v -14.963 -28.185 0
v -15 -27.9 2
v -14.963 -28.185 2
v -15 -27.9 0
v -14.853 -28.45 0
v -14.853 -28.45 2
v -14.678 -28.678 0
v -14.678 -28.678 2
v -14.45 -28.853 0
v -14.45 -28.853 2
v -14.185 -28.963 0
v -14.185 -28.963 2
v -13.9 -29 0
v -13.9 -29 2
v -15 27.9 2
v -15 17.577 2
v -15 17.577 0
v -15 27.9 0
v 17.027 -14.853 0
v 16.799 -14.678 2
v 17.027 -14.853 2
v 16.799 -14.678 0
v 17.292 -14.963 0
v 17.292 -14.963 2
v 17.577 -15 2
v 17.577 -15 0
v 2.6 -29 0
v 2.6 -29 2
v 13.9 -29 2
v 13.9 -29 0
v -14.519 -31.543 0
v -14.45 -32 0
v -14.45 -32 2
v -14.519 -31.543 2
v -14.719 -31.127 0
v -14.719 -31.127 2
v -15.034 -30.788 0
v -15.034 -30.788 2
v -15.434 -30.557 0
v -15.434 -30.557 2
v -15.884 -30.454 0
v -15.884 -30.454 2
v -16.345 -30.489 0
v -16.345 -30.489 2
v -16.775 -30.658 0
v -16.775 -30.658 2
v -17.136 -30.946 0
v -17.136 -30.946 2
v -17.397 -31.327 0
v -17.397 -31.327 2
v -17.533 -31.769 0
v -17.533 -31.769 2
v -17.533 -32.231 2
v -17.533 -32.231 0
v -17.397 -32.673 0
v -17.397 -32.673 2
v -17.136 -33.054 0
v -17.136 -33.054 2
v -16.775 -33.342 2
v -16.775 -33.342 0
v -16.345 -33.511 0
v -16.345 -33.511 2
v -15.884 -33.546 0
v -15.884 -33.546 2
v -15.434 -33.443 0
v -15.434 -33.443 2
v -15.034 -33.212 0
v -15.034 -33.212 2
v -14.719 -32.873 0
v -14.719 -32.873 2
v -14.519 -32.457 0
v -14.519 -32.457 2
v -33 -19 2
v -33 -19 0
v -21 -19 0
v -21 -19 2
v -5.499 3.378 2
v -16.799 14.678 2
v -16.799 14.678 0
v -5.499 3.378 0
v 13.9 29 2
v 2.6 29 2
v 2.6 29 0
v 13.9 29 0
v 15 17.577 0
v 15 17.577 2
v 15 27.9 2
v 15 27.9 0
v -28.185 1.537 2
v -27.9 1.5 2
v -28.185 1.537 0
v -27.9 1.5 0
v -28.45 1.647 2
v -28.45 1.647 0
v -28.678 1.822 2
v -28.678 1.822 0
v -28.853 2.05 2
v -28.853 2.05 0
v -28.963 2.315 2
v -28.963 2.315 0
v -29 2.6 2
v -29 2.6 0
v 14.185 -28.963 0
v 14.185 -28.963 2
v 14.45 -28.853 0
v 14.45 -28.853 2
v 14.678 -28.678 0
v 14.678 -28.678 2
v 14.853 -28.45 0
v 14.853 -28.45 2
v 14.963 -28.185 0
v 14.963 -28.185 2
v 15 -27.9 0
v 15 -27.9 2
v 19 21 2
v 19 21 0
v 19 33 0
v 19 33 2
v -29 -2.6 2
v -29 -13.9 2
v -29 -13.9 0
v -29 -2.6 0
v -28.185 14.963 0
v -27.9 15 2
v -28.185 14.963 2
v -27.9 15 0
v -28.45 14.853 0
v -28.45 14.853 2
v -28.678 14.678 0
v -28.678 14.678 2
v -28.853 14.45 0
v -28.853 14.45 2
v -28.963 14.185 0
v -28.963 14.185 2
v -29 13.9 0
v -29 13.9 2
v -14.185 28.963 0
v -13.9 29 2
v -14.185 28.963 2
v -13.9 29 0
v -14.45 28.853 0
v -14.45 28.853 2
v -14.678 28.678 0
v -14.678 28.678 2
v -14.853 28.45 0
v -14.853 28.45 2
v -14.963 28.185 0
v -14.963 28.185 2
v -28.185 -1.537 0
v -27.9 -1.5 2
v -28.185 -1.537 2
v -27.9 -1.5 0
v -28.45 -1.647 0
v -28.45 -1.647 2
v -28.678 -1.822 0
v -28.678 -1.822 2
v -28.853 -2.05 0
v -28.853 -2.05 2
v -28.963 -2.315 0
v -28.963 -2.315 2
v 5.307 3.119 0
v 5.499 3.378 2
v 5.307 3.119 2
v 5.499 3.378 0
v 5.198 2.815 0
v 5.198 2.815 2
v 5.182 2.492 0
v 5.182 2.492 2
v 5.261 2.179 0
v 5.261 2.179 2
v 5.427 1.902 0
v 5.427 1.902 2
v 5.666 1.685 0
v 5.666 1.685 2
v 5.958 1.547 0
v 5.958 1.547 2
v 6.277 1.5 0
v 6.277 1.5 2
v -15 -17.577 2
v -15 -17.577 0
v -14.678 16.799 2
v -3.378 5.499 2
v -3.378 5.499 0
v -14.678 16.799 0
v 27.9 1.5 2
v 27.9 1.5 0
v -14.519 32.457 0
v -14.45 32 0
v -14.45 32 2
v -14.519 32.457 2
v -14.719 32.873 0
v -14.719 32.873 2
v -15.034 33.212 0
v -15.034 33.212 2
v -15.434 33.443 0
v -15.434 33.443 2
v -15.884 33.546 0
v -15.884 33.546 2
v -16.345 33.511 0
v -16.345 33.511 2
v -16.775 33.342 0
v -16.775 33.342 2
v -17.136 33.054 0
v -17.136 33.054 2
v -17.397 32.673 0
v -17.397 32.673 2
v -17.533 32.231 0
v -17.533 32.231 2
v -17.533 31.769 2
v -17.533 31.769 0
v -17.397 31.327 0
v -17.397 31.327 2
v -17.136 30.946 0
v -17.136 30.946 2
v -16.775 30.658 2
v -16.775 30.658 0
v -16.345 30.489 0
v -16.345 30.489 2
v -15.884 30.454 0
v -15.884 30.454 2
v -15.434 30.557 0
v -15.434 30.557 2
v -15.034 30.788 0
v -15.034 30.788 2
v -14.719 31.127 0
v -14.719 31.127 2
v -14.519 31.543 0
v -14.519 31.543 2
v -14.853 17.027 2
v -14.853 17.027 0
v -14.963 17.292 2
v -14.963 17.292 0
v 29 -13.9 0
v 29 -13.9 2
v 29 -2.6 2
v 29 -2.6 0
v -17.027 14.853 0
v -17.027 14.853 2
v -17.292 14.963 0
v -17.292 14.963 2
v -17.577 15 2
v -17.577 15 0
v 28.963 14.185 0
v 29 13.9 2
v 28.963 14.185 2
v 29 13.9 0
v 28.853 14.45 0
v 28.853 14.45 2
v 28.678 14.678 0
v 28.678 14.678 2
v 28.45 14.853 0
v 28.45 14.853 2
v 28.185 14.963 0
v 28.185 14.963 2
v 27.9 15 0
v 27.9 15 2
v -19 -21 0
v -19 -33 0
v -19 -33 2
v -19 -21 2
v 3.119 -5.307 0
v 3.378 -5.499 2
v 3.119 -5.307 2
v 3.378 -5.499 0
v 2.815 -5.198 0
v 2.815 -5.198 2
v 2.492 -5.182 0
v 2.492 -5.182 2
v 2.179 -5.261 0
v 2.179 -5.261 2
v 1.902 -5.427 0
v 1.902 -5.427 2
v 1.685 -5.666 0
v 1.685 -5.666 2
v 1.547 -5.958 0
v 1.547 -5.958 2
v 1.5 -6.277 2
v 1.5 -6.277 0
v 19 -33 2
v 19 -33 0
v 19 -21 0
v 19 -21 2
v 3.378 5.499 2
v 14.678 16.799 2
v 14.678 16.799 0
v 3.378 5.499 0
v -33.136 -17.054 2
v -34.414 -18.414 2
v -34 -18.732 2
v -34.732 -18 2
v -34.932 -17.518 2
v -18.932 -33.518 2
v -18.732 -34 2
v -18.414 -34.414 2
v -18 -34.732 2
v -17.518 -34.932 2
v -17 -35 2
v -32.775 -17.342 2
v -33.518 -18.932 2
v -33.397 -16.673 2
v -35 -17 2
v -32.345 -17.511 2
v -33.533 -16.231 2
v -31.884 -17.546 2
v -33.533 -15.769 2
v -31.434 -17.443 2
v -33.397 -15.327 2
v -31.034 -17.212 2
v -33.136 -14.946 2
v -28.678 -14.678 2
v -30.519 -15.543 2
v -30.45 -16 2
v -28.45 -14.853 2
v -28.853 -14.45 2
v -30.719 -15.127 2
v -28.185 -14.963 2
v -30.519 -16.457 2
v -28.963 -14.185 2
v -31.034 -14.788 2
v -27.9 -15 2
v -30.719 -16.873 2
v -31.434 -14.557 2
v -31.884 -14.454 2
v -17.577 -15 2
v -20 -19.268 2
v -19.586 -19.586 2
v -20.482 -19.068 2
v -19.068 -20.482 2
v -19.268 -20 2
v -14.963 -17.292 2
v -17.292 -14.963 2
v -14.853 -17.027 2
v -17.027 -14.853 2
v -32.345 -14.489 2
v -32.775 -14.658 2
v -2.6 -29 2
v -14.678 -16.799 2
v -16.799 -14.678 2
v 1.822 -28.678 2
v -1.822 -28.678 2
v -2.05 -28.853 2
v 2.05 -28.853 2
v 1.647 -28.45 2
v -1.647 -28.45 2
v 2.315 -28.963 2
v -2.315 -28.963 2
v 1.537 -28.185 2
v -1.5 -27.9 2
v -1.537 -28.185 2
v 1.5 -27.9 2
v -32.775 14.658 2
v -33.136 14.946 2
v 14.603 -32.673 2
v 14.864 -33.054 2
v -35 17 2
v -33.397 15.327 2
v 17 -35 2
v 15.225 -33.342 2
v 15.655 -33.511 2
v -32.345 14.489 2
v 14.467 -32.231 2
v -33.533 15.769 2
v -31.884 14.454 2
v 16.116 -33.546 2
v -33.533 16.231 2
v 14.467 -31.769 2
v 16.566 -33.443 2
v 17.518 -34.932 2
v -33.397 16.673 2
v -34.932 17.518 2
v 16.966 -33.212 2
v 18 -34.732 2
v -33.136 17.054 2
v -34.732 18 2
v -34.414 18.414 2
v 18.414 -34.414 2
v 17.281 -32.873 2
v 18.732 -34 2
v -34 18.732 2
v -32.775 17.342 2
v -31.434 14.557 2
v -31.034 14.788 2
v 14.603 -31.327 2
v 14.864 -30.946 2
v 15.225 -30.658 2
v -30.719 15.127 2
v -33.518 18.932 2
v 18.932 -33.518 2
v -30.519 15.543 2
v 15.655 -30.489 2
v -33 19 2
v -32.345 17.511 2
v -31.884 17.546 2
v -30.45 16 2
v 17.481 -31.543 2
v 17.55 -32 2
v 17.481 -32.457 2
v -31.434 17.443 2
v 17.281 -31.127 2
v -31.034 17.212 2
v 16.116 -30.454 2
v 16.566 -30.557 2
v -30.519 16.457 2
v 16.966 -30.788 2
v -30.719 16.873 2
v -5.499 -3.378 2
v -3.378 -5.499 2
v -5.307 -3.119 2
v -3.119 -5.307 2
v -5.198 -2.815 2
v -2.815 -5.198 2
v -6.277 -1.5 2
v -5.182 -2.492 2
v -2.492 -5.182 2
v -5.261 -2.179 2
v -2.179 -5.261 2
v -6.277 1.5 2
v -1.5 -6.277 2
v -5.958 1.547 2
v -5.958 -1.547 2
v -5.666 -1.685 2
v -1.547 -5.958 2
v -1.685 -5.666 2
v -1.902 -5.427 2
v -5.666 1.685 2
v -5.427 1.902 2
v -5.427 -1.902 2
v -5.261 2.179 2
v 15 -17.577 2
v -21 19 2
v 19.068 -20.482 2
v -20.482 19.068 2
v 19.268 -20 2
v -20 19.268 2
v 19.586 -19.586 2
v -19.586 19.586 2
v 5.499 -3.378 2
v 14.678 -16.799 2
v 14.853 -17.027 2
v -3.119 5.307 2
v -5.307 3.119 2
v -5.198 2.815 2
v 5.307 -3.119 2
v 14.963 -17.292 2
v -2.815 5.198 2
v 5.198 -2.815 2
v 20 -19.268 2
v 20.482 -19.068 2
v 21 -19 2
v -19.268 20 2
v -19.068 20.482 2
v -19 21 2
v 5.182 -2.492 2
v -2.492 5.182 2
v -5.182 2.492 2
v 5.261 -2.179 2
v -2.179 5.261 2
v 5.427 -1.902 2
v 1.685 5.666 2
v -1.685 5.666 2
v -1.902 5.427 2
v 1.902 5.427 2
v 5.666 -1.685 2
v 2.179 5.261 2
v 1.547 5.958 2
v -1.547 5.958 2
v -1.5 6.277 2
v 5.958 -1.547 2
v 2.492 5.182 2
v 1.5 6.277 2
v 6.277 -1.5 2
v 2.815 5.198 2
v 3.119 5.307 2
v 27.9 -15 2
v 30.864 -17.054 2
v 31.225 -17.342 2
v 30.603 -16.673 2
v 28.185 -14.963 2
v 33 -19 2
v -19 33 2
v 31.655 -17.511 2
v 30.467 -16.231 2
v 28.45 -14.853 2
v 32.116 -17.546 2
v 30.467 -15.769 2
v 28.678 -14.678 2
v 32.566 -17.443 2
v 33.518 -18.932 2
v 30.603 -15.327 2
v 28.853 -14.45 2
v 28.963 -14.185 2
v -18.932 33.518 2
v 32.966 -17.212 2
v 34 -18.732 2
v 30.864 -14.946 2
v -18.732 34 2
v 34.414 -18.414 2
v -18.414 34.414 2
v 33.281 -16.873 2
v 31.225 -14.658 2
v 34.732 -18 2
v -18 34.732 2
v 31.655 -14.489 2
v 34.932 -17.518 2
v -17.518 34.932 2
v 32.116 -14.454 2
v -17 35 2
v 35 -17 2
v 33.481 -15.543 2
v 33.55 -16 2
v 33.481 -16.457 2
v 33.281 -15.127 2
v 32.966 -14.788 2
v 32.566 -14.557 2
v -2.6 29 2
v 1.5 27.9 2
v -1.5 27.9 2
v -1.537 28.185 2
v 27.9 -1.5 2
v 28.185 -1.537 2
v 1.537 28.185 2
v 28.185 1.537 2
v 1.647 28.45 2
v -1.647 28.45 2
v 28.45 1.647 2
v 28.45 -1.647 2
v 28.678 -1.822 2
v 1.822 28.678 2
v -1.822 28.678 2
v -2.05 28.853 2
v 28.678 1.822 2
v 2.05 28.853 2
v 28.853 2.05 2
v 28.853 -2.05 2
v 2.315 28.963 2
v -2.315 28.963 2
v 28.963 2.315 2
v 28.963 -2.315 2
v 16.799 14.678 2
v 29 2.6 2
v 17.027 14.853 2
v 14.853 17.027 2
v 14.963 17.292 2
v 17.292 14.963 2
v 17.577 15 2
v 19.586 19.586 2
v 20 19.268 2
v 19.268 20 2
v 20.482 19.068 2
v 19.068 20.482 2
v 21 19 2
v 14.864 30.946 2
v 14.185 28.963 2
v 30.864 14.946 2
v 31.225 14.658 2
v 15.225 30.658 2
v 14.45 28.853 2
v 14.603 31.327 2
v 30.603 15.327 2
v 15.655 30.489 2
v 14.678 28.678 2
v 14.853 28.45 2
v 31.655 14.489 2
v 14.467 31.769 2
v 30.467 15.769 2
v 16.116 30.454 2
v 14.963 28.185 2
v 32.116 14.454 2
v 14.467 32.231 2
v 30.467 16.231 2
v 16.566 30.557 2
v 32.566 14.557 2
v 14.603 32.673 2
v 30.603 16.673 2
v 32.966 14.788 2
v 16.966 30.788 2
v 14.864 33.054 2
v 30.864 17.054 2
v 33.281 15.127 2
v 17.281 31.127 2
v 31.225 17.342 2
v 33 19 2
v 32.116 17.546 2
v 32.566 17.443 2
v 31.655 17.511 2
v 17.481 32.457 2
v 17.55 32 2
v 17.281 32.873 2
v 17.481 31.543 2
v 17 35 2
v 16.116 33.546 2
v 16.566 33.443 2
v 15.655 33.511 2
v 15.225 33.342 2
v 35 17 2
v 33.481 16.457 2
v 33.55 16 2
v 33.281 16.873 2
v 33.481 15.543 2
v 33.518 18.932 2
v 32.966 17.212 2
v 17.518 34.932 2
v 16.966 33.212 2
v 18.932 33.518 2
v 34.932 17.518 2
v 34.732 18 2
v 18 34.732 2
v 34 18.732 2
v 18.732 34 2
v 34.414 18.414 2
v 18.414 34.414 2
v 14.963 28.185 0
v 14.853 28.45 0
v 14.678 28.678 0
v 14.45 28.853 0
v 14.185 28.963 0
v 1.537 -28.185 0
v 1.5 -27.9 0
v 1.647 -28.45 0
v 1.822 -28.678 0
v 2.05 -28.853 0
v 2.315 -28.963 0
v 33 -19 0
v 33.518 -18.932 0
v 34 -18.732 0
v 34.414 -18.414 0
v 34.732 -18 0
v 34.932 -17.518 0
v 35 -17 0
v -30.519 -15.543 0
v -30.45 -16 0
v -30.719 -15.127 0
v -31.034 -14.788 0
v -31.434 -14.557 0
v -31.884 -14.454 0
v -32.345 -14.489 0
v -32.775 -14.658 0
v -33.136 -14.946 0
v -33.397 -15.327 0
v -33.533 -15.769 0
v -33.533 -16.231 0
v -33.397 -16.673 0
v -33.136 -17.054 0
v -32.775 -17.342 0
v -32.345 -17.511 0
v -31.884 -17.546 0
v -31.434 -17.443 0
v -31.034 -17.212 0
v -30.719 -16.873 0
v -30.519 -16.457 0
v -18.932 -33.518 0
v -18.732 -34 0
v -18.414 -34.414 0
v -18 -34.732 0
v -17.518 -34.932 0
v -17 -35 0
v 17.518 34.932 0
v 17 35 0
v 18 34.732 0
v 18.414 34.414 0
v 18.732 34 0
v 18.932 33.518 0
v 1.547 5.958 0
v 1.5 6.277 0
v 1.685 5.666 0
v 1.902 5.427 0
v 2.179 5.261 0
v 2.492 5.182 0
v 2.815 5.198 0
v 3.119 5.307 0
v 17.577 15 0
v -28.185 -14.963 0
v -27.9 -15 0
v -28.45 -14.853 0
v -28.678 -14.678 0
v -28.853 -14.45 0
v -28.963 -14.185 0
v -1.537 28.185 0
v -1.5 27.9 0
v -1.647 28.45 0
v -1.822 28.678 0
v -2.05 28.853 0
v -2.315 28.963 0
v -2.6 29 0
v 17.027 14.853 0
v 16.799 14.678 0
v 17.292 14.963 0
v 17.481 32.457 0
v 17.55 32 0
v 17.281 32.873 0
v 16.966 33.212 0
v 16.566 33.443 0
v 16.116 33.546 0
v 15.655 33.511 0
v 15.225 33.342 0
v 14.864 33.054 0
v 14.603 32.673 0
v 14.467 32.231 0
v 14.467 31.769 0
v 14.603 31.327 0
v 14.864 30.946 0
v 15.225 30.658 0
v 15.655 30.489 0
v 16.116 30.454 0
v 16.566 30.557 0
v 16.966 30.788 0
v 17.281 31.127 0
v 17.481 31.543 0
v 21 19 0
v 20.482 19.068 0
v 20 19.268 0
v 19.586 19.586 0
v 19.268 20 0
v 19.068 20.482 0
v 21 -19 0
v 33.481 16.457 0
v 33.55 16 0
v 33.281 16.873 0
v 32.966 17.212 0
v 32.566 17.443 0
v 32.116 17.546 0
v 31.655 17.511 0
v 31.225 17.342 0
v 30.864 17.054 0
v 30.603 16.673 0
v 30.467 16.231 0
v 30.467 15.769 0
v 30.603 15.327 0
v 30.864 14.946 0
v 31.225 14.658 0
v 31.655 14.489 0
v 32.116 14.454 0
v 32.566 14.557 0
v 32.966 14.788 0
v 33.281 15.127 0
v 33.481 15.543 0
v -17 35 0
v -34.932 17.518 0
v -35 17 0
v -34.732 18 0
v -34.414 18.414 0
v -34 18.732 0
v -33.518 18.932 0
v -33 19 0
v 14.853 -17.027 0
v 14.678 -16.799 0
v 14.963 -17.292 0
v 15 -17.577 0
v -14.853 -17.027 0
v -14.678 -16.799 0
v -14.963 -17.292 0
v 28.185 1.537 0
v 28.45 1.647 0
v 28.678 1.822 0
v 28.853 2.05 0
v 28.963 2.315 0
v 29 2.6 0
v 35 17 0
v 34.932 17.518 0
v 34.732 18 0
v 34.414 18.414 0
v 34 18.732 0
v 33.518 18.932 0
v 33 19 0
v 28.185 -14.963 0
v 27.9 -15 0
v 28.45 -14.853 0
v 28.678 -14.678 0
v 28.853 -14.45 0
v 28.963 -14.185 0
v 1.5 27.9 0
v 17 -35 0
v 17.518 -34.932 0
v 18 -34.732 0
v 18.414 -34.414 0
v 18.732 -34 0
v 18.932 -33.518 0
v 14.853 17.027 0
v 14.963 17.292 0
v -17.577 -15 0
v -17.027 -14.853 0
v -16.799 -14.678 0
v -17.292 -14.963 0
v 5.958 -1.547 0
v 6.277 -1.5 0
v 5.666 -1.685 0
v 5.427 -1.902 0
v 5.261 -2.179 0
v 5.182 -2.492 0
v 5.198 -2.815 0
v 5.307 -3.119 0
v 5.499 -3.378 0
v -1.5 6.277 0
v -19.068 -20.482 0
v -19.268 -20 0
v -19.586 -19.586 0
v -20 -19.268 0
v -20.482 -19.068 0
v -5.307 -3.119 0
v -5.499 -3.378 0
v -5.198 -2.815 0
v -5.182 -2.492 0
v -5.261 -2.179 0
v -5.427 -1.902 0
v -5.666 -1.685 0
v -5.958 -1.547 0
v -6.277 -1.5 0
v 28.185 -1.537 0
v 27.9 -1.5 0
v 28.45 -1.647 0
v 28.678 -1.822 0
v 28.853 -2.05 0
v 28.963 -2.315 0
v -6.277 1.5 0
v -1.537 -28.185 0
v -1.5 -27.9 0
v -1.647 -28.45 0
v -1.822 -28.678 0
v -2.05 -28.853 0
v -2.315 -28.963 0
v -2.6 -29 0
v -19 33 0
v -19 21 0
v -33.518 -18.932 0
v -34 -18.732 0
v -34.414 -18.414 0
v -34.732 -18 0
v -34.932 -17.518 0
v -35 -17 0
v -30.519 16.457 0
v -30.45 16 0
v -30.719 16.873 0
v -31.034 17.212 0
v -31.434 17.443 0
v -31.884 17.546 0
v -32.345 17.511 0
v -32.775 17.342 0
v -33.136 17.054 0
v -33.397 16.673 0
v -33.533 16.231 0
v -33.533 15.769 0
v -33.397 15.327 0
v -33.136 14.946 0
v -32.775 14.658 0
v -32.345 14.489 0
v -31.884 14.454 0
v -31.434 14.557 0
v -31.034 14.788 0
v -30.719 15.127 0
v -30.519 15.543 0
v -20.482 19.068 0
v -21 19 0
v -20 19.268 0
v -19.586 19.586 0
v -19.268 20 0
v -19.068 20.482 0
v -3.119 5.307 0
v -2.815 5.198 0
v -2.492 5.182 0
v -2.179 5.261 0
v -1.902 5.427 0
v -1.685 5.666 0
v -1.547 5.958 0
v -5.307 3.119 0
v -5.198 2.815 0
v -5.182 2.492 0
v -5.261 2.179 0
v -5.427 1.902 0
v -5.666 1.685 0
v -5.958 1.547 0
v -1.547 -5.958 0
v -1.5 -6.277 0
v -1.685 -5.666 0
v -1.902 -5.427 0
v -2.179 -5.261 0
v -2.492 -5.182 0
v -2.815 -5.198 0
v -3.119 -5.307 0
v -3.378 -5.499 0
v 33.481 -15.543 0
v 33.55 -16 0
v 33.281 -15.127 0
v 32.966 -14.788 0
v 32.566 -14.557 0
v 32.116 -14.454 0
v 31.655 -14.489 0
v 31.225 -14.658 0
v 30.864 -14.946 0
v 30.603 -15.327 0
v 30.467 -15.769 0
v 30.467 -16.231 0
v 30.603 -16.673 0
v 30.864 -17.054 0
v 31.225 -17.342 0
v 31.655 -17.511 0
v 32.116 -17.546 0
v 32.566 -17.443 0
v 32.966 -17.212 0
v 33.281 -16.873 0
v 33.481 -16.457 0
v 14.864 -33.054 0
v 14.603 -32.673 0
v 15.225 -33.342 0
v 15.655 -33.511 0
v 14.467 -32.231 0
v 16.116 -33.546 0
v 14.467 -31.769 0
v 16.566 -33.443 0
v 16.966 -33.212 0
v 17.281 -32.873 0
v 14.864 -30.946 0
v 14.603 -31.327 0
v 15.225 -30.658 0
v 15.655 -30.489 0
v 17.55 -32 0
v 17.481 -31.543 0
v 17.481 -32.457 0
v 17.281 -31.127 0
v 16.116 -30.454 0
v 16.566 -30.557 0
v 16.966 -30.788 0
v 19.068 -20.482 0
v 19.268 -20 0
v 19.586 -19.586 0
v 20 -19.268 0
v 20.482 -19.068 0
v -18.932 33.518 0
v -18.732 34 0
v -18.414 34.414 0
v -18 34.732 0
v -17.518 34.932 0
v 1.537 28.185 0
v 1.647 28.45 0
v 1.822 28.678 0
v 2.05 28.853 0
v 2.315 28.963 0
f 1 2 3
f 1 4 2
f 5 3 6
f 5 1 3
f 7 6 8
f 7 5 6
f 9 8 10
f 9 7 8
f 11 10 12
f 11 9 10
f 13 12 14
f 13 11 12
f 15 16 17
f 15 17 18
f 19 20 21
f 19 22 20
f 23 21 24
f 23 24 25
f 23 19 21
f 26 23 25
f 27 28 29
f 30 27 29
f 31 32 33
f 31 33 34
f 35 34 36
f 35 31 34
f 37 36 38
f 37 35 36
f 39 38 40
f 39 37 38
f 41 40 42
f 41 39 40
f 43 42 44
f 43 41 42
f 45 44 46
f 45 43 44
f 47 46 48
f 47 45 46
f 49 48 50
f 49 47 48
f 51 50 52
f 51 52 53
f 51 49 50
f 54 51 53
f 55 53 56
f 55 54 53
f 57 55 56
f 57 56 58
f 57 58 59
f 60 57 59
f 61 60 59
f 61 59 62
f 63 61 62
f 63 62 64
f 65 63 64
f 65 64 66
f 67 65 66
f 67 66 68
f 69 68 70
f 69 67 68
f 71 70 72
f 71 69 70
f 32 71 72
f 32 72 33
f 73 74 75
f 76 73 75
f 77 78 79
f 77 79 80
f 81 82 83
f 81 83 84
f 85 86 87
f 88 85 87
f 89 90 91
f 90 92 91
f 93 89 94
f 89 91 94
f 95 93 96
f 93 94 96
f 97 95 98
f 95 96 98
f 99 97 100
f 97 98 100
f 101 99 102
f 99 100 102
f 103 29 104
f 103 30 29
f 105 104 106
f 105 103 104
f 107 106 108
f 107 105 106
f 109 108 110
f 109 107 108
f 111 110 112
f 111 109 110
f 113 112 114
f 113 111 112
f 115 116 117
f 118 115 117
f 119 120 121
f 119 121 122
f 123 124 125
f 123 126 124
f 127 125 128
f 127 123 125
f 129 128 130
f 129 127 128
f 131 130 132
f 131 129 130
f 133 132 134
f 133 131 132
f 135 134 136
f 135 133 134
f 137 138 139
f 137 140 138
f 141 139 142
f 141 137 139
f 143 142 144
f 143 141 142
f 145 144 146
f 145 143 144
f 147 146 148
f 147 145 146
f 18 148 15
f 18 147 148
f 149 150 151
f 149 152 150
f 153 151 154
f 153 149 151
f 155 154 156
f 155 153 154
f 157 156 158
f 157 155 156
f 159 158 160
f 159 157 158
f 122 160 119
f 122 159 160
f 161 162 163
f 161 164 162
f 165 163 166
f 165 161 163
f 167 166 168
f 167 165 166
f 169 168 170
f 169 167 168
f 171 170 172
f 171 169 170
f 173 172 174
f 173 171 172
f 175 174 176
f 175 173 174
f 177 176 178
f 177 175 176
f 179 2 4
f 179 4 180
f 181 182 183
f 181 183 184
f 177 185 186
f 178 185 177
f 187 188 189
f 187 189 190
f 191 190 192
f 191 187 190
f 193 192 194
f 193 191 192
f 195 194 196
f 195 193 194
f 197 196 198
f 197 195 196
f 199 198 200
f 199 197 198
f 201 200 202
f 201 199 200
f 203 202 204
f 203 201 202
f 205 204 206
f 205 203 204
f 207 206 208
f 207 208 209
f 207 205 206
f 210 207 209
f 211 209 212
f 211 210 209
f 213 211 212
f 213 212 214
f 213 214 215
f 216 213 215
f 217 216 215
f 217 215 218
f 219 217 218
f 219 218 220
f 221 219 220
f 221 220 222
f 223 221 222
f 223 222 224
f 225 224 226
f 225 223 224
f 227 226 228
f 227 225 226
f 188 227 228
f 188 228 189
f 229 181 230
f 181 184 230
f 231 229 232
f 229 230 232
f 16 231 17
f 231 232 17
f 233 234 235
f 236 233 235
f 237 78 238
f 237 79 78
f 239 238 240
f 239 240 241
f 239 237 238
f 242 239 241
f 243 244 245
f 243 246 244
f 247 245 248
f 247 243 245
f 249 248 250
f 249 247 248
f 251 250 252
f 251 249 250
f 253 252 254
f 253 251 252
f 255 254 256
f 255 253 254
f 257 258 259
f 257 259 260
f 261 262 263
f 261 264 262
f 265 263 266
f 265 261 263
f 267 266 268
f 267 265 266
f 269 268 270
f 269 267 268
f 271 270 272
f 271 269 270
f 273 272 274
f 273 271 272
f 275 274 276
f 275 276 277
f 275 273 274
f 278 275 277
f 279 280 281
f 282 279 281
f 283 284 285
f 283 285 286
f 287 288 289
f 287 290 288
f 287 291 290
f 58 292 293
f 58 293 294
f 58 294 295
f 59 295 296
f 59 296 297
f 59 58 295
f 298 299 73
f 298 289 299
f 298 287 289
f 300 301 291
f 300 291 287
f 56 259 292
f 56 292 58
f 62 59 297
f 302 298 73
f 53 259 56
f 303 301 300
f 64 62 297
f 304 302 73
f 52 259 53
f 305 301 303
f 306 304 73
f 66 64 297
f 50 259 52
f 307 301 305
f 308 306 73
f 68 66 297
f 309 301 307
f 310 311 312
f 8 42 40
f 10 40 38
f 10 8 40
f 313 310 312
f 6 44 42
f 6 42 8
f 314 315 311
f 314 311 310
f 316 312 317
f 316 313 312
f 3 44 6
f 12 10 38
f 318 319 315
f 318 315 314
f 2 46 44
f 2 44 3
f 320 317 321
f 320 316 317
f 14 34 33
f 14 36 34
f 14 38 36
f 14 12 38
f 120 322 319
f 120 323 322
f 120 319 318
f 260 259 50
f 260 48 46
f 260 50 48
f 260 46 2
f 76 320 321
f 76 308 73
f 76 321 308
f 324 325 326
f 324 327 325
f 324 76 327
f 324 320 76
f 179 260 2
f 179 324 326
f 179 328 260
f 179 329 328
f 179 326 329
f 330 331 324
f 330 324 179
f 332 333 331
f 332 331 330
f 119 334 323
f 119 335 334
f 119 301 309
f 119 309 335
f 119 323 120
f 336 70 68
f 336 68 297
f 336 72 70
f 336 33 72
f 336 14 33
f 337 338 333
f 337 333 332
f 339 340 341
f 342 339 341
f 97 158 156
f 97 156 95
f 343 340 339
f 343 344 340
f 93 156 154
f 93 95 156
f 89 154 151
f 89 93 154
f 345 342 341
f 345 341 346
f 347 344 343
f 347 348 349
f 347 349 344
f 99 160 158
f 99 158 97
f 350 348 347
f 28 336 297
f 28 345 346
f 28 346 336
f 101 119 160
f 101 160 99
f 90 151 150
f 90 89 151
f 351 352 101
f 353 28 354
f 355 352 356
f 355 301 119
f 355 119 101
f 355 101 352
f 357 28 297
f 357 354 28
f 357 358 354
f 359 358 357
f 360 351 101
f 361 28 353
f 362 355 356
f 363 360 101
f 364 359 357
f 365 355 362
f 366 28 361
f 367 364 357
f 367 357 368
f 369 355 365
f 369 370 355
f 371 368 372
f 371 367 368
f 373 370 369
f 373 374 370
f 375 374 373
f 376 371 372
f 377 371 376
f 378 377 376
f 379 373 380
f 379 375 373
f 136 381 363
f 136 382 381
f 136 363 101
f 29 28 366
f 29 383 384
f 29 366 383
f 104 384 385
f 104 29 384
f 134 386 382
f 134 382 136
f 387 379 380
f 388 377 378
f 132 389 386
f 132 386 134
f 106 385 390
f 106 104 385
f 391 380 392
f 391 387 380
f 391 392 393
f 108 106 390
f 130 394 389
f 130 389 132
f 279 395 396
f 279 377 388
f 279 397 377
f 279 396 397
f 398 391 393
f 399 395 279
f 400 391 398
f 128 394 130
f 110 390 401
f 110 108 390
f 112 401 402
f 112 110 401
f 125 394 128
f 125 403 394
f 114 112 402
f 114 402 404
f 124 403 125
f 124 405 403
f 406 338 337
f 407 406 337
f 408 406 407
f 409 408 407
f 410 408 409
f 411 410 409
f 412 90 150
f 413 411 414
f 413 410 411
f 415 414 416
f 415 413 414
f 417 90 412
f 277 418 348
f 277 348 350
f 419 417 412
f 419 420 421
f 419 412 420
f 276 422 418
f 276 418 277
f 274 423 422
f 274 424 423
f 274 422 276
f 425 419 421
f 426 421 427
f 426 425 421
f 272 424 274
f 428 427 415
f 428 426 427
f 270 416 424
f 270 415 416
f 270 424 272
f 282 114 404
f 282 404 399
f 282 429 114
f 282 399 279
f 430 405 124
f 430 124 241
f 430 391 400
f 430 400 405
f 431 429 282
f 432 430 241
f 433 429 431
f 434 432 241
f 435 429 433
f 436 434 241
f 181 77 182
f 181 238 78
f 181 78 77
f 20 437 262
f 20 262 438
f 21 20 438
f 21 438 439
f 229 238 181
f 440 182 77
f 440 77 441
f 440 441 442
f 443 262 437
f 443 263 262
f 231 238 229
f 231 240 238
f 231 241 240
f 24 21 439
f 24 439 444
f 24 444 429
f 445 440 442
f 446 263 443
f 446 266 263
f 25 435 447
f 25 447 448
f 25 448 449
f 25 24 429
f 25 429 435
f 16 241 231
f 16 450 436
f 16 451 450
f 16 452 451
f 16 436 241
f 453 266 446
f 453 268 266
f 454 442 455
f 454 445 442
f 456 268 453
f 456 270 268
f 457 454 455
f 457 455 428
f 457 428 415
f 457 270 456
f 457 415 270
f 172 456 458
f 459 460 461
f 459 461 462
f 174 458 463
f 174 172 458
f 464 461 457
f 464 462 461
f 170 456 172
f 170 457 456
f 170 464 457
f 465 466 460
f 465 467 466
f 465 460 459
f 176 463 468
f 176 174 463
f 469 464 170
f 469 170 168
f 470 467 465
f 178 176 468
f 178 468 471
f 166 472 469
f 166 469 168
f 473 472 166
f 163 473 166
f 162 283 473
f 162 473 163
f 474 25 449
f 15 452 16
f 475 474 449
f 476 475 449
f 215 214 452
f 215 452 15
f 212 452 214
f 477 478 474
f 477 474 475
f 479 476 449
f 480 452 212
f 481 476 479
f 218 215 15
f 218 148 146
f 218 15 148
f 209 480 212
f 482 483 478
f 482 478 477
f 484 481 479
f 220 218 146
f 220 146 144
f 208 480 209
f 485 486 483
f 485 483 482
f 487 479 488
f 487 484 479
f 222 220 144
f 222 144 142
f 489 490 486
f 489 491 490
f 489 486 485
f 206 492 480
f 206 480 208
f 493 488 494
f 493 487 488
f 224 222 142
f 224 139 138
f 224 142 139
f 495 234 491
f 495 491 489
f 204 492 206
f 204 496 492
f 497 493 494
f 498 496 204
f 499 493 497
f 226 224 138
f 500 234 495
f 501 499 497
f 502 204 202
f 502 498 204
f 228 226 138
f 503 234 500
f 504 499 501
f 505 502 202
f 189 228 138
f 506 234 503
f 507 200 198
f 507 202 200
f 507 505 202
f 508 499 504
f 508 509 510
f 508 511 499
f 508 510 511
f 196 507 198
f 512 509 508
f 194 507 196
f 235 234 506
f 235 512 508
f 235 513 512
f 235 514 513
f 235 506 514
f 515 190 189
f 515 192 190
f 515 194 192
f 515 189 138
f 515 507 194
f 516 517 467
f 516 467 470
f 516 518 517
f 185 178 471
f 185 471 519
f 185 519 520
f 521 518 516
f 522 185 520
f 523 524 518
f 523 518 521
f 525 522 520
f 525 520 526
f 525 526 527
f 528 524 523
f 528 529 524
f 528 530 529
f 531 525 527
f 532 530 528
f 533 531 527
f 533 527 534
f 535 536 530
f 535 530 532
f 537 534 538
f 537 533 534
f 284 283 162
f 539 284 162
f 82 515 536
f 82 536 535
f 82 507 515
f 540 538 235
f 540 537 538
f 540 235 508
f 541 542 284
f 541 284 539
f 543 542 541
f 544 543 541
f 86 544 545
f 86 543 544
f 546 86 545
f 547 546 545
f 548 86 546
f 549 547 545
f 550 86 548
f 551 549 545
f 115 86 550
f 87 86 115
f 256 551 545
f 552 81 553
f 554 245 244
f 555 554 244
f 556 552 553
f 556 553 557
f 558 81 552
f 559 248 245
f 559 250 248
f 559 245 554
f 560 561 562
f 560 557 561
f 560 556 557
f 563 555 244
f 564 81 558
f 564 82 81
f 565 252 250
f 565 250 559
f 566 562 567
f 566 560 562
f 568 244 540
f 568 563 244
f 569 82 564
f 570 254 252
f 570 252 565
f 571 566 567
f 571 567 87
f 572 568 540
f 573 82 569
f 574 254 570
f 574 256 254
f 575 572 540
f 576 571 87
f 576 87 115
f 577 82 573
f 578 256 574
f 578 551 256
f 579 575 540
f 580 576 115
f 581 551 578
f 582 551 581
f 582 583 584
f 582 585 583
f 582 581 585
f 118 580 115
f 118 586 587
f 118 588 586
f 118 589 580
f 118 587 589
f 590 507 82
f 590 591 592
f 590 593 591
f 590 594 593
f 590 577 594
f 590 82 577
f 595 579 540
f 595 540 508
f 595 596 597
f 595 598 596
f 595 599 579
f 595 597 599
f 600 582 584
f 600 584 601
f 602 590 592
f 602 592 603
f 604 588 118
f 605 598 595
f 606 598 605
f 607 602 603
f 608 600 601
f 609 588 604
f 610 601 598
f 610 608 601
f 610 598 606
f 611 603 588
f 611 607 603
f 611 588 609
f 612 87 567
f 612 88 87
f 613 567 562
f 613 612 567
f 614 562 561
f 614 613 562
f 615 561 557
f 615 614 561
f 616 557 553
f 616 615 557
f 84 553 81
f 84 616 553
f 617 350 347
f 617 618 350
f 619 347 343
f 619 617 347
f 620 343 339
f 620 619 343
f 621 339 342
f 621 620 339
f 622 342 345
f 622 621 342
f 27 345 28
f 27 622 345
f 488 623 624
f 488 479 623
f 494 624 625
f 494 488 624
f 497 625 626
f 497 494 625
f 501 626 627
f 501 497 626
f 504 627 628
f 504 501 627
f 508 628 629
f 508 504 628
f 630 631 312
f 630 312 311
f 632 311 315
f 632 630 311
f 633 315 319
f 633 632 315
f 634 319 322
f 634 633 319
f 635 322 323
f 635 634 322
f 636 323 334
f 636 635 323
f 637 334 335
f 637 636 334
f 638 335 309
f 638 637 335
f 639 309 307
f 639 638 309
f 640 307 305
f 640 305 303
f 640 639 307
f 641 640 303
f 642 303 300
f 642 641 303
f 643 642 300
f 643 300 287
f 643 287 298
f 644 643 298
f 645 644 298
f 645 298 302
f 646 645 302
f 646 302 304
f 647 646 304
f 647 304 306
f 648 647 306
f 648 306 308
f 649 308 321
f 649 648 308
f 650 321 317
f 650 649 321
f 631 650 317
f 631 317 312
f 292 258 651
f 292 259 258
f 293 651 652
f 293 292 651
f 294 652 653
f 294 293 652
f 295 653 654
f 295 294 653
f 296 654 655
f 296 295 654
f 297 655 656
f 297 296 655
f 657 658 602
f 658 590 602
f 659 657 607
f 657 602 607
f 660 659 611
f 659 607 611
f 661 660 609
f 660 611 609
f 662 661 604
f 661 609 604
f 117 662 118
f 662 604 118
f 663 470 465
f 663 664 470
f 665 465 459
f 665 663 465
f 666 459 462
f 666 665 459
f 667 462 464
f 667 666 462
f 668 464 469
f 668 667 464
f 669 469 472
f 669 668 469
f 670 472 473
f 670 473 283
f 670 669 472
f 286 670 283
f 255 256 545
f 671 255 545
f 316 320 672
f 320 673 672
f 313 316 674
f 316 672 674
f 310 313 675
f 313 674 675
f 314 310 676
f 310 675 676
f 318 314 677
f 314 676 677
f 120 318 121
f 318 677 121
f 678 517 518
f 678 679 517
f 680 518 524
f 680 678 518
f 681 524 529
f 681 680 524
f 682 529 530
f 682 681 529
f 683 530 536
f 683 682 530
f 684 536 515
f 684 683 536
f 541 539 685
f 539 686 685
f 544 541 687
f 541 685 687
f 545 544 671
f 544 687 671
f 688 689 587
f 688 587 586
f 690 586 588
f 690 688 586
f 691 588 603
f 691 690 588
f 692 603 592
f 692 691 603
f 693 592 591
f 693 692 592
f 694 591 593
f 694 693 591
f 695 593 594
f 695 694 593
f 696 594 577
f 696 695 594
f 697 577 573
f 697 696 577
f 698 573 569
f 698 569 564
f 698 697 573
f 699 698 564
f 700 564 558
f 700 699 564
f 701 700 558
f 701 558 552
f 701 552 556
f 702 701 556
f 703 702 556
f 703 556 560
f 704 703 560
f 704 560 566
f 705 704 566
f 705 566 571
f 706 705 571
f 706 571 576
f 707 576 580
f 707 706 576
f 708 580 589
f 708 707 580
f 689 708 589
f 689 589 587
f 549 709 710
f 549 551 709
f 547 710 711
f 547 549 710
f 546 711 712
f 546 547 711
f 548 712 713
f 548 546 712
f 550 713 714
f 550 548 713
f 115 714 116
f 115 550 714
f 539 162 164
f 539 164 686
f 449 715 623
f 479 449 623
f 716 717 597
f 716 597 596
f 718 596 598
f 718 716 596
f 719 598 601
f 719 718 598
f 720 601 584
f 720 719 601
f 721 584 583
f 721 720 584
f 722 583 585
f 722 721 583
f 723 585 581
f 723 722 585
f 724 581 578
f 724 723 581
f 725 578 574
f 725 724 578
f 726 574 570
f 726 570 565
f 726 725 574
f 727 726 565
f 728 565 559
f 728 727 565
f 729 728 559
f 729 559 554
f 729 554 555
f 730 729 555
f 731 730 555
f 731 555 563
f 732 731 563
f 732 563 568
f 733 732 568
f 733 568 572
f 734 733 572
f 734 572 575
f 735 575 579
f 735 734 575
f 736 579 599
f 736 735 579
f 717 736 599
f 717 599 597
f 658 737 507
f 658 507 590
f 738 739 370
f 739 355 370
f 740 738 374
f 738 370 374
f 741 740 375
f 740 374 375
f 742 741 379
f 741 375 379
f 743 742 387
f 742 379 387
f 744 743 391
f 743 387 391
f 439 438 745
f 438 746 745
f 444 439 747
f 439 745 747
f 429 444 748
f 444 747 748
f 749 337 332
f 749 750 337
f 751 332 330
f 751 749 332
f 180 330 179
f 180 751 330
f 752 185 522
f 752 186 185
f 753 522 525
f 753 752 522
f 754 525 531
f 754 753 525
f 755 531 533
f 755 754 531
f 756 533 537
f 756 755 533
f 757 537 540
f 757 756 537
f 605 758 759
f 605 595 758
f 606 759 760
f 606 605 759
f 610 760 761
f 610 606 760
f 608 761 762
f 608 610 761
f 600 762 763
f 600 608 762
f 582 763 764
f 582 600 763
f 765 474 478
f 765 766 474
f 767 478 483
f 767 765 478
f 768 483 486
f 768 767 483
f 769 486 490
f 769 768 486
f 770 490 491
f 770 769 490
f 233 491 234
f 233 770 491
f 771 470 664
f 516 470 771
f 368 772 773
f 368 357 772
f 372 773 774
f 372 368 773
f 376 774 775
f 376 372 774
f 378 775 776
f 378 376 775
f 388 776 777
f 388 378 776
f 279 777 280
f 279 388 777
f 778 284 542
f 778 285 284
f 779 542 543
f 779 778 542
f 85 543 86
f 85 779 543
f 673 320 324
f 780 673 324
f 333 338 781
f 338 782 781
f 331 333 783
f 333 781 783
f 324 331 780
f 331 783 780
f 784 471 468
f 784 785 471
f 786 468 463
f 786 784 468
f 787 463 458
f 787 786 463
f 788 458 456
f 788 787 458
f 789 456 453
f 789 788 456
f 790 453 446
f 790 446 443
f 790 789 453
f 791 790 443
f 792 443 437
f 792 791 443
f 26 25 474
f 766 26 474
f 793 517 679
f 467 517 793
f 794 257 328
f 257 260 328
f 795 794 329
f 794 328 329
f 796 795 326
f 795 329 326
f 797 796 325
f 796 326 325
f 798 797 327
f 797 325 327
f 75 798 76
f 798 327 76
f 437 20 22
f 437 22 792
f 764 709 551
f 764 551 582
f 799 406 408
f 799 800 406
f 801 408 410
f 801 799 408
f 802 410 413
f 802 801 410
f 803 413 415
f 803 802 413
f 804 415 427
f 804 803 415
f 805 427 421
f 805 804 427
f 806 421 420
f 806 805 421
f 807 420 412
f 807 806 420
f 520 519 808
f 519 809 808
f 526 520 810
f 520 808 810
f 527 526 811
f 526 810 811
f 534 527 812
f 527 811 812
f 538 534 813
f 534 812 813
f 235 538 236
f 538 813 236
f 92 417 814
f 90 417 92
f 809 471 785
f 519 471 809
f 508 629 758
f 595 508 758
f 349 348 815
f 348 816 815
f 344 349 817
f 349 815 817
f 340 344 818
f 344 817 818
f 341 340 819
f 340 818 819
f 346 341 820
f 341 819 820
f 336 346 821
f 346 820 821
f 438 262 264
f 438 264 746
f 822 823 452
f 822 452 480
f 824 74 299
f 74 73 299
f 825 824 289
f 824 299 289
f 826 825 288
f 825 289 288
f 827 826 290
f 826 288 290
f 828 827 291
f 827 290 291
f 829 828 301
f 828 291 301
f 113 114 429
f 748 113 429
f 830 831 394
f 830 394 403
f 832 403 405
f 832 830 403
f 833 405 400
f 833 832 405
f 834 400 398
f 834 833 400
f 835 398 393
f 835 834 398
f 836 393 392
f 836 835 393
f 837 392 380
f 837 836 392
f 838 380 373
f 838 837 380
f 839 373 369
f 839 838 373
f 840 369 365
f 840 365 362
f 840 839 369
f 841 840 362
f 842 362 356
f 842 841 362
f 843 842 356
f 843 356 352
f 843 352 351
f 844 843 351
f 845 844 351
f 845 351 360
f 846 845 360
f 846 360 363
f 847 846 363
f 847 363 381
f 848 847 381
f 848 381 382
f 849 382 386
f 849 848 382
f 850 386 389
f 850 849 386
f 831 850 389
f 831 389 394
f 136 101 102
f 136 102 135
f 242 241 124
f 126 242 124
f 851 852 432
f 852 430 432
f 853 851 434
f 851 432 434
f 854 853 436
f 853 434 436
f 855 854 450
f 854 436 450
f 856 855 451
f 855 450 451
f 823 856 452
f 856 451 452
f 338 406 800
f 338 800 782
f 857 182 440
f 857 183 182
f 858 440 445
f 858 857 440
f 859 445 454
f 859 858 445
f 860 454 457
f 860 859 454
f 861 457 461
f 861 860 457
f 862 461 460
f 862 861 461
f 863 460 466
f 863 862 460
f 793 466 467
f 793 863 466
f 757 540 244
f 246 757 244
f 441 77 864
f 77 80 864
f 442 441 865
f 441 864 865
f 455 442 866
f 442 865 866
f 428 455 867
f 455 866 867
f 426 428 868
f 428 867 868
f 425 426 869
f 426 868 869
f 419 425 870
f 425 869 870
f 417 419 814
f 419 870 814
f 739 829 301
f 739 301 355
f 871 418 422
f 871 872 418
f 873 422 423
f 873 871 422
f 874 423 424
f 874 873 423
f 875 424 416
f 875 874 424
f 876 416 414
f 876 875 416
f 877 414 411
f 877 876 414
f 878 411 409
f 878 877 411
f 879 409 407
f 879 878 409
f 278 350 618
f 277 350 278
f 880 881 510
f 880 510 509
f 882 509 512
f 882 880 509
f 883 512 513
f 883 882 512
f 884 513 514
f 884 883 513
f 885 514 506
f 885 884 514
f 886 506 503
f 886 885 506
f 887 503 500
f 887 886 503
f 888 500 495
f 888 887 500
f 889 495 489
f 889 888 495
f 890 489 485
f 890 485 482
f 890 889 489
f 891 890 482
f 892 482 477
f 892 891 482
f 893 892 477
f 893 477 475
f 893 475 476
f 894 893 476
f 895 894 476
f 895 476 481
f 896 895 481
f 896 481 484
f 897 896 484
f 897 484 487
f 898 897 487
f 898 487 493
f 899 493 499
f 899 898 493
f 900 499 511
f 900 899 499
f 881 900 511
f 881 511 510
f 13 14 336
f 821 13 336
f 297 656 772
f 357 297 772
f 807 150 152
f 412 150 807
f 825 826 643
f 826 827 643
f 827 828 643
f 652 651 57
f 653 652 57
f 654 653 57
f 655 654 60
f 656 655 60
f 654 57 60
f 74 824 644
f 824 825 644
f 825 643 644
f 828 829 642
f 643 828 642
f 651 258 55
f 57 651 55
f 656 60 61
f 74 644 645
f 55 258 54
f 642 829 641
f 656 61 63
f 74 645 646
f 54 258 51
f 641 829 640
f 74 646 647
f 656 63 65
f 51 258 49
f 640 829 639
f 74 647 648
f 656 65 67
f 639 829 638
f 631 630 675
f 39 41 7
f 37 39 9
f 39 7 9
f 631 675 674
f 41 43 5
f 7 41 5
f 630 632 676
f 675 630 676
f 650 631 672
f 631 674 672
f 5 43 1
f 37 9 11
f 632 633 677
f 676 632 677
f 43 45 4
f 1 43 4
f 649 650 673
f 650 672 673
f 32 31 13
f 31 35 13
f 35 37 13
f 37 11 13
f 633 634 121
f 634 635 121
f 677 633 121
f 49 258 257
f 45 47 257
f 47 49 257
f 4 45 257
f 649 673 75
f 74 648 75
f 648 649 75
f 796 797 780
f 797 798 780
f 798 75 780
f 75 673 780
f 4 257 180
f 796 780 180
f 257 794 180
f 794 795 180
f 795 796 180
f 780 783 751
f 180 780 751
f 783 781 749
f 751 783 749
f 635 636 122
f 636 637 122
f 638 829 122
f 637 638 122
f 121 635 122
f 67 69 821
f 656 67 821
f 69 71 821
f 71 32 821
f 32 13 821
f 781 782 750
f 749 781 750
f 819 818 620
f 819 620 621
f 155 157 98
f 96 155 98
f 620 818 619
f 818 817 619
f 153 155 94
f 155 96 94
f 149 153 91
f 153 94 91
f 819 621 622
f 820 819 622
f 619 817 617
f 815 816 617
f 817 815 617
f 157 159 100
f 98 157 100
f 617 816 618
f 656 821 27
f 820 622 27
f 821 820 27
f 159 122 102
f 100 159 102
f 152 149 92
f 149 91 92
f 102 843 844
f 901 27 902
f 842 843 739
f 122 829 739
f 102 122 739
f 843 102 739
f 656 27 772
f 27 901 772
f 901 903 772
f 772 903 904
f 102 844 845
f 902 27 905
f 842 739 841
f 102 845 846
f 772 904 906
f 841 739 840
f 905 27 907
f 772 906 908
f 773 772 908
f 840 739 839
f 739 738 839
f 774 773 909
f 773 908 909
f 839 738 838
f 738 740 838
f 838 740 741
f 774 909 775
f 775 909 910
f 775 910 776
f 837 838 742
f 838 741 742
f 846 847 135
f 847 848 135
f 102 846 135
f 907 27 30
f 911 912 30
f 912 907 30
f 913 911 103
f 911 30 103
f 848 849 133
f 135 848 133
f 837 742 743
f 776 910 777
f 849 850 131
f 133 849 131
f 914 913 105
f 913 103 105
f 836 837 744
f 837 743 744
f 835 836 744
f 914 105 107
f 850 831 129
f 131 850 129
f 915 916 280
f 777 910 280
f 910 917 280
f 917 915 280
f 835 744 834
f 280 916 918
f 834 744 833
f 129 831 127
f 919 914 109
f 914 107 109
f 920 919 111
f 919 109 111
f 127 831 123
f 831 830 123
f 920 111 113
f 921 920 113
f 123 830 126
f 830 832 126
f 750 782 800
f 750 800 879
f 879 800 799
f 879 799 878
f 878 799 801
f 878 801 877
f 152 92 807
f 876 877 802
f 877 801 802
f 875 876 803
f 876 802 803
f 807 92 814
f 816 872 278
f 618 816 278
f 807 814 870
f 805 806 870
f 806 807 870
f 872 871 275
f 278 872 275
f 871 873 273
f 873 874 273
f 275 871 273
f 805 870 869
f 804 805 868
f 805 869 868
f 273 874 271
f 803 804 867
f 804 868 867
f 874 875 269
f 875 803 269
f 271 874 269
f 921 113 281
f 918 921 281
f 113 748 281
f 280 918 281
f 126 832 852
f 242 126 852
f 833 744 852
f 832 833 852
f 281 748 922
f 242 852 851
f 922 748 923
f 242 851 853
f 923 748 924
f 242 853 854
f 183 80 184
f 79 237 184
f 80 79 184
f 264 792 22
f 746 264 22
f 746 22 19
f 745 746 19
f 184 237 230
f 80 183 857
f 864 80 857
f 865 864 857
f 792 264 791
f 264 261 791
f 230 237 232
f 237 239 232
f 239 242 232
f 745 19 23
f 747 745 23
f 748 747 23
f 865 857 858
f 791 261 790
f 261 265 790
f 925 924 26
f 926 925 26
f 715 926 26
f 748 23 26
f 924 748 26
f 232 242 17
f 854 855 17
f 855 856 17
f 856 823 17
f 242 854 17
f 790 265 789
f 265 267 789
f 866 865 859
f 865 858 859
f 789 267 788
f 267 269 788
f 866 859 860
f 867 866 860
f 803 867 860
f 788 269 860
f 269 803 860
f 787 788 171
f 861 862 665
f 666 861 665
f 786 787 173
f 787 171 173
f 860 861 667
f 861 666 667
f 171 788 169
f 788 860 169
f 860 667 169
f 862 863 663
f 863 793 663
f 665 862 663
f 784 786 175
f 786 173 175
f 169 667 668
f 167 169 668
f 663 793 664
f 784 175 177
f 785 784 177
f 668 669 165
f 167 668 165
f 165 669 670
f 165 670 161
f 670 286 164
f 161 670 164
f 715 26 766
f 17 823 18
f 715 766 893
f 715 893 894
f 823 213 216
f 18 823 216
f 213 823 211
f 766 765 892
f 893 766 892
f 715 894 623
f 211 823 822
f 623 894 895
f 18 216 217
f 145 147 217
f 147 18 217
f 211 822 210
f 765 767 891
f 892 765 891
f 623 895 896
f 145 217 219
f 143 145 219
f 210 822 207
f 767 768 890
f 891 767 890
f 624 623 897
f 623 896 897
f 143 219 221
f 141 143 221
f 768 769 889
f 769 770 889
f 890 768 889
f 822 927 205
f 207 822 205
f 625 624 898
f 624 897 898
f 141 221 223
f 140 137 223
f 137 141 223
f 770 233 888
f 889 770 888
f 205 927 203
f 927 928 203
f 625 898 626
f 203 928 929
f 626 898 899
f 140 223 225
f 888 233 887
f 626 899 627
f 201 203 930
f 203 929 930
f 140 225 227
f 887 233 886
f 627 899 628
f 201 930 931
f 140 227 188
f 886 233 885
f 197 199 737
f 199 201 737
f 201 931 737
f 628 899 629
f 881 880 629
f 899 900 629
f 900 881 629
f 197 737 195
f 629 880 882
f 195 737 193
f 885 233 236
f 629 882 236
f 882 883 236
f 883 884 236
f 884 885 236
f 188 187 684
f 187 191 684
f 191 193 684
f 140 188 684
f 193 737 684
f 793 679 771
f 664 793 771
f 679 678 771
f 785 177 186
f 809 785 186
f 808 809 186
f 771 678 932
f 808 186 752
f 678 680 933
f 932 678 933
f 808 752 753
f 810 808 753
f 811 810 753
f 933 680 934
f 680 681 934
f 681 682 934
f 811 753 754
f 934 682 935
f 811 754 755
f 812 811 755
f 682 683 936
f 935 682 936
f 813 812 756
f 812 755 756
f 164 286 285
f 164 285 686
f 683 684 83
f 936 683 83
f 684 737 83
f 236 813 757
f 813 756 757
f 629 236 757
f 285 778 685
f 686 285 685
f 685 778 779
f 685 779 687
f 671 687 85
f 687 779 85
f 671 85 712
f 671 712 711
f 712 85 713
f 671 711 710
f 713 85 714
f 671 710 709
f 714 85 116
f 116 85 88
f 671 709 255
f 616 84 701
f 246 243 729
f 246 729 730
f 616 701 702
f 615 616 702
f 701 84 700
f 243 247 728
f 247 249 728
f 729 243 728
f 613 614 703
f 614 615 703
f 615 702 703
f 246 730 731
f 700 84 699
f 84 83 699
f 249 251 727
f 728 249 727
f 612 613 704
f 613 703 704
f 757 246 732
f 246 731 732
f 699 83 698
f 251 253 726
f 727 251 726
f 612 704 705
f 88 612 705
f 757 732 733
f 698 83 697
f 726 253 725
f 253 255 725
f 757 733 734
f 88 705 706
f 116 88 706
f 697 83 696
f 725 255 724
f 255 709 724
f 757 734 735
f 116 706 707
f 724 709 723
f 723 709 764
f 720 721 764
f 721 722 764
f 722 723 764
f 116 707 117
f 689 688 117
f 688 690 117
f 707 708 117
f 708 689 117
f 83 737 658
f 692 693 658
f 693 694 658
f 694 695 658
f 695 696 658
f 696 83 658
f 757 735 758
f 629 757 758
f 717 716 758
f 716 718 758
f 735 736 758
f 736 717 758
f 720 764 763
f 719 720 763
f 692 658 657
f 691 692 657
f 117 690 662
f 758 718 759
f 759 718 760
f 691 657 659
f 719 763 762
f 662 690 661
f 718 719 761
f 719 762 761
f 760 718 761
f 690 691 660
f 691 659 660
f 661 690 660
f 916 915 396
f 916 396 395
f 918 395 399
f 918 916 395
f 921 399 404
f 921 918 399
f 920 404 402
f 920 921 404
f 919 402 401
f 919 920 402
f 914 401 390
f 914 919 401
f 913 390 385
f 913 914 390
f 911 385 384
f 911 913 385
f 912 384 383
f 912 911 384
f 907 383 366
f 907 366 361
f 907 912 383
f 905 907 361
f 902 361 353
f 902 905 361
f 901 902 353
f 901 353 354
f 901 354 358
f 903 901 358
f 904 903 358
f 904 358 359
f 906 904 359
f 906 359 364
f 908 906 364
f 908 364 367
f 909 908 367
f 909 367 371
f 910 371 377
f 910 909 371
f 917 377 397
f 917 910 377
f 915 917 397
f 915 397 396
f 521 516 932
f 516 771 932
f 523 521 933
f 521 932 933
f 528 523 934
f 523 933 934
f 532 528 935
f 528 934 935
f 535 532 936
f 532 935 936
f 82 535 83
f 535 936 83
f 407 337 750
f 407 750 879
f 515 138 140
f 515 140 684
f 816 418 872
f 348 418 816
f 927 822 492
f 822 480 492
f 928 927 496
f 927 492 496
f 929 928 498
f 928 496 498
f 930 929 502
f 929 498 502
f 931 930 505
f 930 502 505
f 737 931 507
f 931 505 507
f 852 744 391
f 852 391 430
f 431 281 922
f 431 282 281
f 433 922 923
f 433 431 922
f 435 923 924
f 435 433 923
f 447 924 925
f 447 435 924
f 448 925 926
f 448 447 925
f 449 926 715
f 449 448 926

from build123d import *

# Parameters (mm, degrees)
SKETCH_1_W          = 16
SKETCH_1_H          = 38
SKETCH_1_R          = 1.55
SKETCH_1_W_2        = 38
SKETCH_1_H_2        = 16
EXTRUDE_1_DEPTH     = 2
FILLET_1_R          = 2
SKETCH_2_W          = 14
SKETCH_2_H          = 30
SKETCH_2_W_2        = 30
SKETCH_2_H_2        = 14
CUT_EXTRUDE_1_DEPTH = 2
EXTRUDE_2_DEPTH     = 2
FILLET_2_R          = 1.1


with BuildPart() as part:
    # 草图1 → 凸台-拉伸1 (new body)
    # profile 1 of 5: a face of its own
    with BuildSketch(Plane.XY):
        with Locations((-27, 0)):
            Rectangle(SKETCH_1_W, SKETCH_1_H)
        with Locations((-32, -16)):
            Circle(SKETCH_1_R, mode=Mode.SUBTRACT)
        with Locations((-32, 16)):
            Circle(SKETCH_1_R, mode=Mode.SUBTRACT)
    # profile 2 of 5: a face of its own
    with BuildSketch(Plane.XY):
        Rectangle(SKETCH_1_W_2, SKETCH_1_H)
    # profile 3 of 5: a face of its own
    with BuildSketch(Plane.XY):
        with Locations((0, 27)):
            Rectangle(SKETCH_1_W_2, SKETCH_1_H_2)
        with Locations((-16, 32)):
            Circle(SKETCH_1_R, mode=Mode.SUBTRACT)
        with Locations((16, 32)):
            Circle(SKETCH_1_R, mode=Mode.SUBTRACT)
    # profile 4 of 5: a face of its own
    with BuildSketch(Plane.XY):
        with Locations((27, 0)):
            Rectangle(SKETCH_1_W, SKETCH_1_H)
        with Locations((32, -16)):
            Circle(SKETCH_1_R, mode=Mode.SUBTRACT)
        with Locations((32, 16)):
            Circle(SKETCH_1_R, mode=Mode.SUBTRACT)
    # profile 5 of 5: a face of its own
    with BuildSketch(Plane.XY):
        with Locations((0, -27)):
            Rectangle(SKETCH_1_W_2, SKETCH_1_H_2)
        with Locations((-16, -32)):
            Circle(SKETCH_1_R, mode=Mode.SUBTRACT)
        with Locations((16, -32)):
            Circle(SKETCH_1_R, mode=Mode.SUBTRACT)
    extrude(amount=EXTRUDE_1_DEPTH)

    # 圆角1
    fillet_1_edges = [part.edges().sort_by_distance(p)[0] for p in [
        (-19, 19, 1),
        (-19, 35, 1),
        (19, 35, 1),
        (19, 19, 1),
        (35, 19, 1),
        (35, -19, 1),
        (19, -19, 1),
        (19, -35, 1),
        (-19, -35, 1),
        (-19, -19, 1),
        (-35, -19, 1),
        (-35, 19, 1),
    ]]
    fillet(fillet_1_edges, radius=FILLET_1_R)

    # 草图2 → 切除-拉伸1 (cut)
    with BuildSketch(Plane.XY.offset(2)):
        with Locations((-22, 0)):
            Rectangle(SKETCH_2_W, SKETCH_2_H)
        with Locations((22, 0)):
            Rectangle(SKETCH_2_W, SKETCH_2_H)
        Rectangle(SKETCH_2_W_2, SKETCH_2_H)
        with Locations((0, -22)):
            Rectangle(SKETCH_2_W_2, SKETCH_2_H_2)
        with Locations((0, 22)):
            Rectangle(SKETCH_2_W_2, SKETCH_2_H_2)
    extrude(amount=-CUT_EXTRUDE_1_DEPTH, mode=Mode.SUBTRACT)

    # 草图3 → 凸台-拉伸2 (add)
    with BuildSketch(Plane.XY.offset(2)):
        Polygon((-17.121320344, 15), (-3.621320344, 1.5), (-29, 1.5), (-29, -1.5), (-3.621320344, -1.5), (-17.121320344, -15), (-15, -17.121320344), (-1.5, -3.621320344), (-1.5, -29), (1.5, -29), (1.5, -3.621320344), (13.939339828, -16.060660172), (15, -17.121320344), (17.121320344, -15), (16.060660172, -13.939339828), (3.621320344, -1.5), (29, -1.5), (29, 1.5), (3.621320344, 1.5), (17.121320344, 15), (15, 17.121320344), (1.5, 3.621320344), (1.5, 29), (-1.5, 29), (-1.5, 3.621320344), (-15, 17.121320344), align=None)
    extrude(amount=-EXTRUDE_2_DEPTH)

    # 圆角2
    fillet_2_edges = [part.edges().sort_by_distance(p)[0] for p in [
        (-29, -15, 1),
        (-29, 15, 1),
        (-15, 29, 1),
        (15, 29, 1),
        (29, 15, 1),
        (29, -15, 1),
        (15, -29, 1),
        (-15, -29, 1),
        (-17.121320344, 15, 1),
        (-15, 17.121320344, 1),
        (-1.5, 3.621320344, 1),
        (-1.5, 29, 1),
        (1.5, 29, 1),
        (1.5, 3.621320344, 1),
        (15, 17.121320344, 1),
        (17.121320344, 15, 1),
        (3.621320344, 1.5, 1),
        (29, 1.5, 1),
        (29, -1.5, 1),
        (3.621320344, -1.5, 1),
        (17.121320344, -15, 1),
        (15, -17.121320344, 1),
        (1.5, -3.621320344, 1),
        (1.5, -29, 1),
        (-1.5, -29, 1),
        (-1.5, -3.621320344, 1),
        (-15, -17.121320344, 1),
        (-17.121320344, -15, 1),
        (-3.621320344, -1.5, 1),
        (-29, -1.5, 1),
        (-29, 1.5, 1),
        (-3.621320344, 1.5, 1),
    ]]
    fillet(fillet_2_edges, radius=FILLET_2_R)


solid = part.part
